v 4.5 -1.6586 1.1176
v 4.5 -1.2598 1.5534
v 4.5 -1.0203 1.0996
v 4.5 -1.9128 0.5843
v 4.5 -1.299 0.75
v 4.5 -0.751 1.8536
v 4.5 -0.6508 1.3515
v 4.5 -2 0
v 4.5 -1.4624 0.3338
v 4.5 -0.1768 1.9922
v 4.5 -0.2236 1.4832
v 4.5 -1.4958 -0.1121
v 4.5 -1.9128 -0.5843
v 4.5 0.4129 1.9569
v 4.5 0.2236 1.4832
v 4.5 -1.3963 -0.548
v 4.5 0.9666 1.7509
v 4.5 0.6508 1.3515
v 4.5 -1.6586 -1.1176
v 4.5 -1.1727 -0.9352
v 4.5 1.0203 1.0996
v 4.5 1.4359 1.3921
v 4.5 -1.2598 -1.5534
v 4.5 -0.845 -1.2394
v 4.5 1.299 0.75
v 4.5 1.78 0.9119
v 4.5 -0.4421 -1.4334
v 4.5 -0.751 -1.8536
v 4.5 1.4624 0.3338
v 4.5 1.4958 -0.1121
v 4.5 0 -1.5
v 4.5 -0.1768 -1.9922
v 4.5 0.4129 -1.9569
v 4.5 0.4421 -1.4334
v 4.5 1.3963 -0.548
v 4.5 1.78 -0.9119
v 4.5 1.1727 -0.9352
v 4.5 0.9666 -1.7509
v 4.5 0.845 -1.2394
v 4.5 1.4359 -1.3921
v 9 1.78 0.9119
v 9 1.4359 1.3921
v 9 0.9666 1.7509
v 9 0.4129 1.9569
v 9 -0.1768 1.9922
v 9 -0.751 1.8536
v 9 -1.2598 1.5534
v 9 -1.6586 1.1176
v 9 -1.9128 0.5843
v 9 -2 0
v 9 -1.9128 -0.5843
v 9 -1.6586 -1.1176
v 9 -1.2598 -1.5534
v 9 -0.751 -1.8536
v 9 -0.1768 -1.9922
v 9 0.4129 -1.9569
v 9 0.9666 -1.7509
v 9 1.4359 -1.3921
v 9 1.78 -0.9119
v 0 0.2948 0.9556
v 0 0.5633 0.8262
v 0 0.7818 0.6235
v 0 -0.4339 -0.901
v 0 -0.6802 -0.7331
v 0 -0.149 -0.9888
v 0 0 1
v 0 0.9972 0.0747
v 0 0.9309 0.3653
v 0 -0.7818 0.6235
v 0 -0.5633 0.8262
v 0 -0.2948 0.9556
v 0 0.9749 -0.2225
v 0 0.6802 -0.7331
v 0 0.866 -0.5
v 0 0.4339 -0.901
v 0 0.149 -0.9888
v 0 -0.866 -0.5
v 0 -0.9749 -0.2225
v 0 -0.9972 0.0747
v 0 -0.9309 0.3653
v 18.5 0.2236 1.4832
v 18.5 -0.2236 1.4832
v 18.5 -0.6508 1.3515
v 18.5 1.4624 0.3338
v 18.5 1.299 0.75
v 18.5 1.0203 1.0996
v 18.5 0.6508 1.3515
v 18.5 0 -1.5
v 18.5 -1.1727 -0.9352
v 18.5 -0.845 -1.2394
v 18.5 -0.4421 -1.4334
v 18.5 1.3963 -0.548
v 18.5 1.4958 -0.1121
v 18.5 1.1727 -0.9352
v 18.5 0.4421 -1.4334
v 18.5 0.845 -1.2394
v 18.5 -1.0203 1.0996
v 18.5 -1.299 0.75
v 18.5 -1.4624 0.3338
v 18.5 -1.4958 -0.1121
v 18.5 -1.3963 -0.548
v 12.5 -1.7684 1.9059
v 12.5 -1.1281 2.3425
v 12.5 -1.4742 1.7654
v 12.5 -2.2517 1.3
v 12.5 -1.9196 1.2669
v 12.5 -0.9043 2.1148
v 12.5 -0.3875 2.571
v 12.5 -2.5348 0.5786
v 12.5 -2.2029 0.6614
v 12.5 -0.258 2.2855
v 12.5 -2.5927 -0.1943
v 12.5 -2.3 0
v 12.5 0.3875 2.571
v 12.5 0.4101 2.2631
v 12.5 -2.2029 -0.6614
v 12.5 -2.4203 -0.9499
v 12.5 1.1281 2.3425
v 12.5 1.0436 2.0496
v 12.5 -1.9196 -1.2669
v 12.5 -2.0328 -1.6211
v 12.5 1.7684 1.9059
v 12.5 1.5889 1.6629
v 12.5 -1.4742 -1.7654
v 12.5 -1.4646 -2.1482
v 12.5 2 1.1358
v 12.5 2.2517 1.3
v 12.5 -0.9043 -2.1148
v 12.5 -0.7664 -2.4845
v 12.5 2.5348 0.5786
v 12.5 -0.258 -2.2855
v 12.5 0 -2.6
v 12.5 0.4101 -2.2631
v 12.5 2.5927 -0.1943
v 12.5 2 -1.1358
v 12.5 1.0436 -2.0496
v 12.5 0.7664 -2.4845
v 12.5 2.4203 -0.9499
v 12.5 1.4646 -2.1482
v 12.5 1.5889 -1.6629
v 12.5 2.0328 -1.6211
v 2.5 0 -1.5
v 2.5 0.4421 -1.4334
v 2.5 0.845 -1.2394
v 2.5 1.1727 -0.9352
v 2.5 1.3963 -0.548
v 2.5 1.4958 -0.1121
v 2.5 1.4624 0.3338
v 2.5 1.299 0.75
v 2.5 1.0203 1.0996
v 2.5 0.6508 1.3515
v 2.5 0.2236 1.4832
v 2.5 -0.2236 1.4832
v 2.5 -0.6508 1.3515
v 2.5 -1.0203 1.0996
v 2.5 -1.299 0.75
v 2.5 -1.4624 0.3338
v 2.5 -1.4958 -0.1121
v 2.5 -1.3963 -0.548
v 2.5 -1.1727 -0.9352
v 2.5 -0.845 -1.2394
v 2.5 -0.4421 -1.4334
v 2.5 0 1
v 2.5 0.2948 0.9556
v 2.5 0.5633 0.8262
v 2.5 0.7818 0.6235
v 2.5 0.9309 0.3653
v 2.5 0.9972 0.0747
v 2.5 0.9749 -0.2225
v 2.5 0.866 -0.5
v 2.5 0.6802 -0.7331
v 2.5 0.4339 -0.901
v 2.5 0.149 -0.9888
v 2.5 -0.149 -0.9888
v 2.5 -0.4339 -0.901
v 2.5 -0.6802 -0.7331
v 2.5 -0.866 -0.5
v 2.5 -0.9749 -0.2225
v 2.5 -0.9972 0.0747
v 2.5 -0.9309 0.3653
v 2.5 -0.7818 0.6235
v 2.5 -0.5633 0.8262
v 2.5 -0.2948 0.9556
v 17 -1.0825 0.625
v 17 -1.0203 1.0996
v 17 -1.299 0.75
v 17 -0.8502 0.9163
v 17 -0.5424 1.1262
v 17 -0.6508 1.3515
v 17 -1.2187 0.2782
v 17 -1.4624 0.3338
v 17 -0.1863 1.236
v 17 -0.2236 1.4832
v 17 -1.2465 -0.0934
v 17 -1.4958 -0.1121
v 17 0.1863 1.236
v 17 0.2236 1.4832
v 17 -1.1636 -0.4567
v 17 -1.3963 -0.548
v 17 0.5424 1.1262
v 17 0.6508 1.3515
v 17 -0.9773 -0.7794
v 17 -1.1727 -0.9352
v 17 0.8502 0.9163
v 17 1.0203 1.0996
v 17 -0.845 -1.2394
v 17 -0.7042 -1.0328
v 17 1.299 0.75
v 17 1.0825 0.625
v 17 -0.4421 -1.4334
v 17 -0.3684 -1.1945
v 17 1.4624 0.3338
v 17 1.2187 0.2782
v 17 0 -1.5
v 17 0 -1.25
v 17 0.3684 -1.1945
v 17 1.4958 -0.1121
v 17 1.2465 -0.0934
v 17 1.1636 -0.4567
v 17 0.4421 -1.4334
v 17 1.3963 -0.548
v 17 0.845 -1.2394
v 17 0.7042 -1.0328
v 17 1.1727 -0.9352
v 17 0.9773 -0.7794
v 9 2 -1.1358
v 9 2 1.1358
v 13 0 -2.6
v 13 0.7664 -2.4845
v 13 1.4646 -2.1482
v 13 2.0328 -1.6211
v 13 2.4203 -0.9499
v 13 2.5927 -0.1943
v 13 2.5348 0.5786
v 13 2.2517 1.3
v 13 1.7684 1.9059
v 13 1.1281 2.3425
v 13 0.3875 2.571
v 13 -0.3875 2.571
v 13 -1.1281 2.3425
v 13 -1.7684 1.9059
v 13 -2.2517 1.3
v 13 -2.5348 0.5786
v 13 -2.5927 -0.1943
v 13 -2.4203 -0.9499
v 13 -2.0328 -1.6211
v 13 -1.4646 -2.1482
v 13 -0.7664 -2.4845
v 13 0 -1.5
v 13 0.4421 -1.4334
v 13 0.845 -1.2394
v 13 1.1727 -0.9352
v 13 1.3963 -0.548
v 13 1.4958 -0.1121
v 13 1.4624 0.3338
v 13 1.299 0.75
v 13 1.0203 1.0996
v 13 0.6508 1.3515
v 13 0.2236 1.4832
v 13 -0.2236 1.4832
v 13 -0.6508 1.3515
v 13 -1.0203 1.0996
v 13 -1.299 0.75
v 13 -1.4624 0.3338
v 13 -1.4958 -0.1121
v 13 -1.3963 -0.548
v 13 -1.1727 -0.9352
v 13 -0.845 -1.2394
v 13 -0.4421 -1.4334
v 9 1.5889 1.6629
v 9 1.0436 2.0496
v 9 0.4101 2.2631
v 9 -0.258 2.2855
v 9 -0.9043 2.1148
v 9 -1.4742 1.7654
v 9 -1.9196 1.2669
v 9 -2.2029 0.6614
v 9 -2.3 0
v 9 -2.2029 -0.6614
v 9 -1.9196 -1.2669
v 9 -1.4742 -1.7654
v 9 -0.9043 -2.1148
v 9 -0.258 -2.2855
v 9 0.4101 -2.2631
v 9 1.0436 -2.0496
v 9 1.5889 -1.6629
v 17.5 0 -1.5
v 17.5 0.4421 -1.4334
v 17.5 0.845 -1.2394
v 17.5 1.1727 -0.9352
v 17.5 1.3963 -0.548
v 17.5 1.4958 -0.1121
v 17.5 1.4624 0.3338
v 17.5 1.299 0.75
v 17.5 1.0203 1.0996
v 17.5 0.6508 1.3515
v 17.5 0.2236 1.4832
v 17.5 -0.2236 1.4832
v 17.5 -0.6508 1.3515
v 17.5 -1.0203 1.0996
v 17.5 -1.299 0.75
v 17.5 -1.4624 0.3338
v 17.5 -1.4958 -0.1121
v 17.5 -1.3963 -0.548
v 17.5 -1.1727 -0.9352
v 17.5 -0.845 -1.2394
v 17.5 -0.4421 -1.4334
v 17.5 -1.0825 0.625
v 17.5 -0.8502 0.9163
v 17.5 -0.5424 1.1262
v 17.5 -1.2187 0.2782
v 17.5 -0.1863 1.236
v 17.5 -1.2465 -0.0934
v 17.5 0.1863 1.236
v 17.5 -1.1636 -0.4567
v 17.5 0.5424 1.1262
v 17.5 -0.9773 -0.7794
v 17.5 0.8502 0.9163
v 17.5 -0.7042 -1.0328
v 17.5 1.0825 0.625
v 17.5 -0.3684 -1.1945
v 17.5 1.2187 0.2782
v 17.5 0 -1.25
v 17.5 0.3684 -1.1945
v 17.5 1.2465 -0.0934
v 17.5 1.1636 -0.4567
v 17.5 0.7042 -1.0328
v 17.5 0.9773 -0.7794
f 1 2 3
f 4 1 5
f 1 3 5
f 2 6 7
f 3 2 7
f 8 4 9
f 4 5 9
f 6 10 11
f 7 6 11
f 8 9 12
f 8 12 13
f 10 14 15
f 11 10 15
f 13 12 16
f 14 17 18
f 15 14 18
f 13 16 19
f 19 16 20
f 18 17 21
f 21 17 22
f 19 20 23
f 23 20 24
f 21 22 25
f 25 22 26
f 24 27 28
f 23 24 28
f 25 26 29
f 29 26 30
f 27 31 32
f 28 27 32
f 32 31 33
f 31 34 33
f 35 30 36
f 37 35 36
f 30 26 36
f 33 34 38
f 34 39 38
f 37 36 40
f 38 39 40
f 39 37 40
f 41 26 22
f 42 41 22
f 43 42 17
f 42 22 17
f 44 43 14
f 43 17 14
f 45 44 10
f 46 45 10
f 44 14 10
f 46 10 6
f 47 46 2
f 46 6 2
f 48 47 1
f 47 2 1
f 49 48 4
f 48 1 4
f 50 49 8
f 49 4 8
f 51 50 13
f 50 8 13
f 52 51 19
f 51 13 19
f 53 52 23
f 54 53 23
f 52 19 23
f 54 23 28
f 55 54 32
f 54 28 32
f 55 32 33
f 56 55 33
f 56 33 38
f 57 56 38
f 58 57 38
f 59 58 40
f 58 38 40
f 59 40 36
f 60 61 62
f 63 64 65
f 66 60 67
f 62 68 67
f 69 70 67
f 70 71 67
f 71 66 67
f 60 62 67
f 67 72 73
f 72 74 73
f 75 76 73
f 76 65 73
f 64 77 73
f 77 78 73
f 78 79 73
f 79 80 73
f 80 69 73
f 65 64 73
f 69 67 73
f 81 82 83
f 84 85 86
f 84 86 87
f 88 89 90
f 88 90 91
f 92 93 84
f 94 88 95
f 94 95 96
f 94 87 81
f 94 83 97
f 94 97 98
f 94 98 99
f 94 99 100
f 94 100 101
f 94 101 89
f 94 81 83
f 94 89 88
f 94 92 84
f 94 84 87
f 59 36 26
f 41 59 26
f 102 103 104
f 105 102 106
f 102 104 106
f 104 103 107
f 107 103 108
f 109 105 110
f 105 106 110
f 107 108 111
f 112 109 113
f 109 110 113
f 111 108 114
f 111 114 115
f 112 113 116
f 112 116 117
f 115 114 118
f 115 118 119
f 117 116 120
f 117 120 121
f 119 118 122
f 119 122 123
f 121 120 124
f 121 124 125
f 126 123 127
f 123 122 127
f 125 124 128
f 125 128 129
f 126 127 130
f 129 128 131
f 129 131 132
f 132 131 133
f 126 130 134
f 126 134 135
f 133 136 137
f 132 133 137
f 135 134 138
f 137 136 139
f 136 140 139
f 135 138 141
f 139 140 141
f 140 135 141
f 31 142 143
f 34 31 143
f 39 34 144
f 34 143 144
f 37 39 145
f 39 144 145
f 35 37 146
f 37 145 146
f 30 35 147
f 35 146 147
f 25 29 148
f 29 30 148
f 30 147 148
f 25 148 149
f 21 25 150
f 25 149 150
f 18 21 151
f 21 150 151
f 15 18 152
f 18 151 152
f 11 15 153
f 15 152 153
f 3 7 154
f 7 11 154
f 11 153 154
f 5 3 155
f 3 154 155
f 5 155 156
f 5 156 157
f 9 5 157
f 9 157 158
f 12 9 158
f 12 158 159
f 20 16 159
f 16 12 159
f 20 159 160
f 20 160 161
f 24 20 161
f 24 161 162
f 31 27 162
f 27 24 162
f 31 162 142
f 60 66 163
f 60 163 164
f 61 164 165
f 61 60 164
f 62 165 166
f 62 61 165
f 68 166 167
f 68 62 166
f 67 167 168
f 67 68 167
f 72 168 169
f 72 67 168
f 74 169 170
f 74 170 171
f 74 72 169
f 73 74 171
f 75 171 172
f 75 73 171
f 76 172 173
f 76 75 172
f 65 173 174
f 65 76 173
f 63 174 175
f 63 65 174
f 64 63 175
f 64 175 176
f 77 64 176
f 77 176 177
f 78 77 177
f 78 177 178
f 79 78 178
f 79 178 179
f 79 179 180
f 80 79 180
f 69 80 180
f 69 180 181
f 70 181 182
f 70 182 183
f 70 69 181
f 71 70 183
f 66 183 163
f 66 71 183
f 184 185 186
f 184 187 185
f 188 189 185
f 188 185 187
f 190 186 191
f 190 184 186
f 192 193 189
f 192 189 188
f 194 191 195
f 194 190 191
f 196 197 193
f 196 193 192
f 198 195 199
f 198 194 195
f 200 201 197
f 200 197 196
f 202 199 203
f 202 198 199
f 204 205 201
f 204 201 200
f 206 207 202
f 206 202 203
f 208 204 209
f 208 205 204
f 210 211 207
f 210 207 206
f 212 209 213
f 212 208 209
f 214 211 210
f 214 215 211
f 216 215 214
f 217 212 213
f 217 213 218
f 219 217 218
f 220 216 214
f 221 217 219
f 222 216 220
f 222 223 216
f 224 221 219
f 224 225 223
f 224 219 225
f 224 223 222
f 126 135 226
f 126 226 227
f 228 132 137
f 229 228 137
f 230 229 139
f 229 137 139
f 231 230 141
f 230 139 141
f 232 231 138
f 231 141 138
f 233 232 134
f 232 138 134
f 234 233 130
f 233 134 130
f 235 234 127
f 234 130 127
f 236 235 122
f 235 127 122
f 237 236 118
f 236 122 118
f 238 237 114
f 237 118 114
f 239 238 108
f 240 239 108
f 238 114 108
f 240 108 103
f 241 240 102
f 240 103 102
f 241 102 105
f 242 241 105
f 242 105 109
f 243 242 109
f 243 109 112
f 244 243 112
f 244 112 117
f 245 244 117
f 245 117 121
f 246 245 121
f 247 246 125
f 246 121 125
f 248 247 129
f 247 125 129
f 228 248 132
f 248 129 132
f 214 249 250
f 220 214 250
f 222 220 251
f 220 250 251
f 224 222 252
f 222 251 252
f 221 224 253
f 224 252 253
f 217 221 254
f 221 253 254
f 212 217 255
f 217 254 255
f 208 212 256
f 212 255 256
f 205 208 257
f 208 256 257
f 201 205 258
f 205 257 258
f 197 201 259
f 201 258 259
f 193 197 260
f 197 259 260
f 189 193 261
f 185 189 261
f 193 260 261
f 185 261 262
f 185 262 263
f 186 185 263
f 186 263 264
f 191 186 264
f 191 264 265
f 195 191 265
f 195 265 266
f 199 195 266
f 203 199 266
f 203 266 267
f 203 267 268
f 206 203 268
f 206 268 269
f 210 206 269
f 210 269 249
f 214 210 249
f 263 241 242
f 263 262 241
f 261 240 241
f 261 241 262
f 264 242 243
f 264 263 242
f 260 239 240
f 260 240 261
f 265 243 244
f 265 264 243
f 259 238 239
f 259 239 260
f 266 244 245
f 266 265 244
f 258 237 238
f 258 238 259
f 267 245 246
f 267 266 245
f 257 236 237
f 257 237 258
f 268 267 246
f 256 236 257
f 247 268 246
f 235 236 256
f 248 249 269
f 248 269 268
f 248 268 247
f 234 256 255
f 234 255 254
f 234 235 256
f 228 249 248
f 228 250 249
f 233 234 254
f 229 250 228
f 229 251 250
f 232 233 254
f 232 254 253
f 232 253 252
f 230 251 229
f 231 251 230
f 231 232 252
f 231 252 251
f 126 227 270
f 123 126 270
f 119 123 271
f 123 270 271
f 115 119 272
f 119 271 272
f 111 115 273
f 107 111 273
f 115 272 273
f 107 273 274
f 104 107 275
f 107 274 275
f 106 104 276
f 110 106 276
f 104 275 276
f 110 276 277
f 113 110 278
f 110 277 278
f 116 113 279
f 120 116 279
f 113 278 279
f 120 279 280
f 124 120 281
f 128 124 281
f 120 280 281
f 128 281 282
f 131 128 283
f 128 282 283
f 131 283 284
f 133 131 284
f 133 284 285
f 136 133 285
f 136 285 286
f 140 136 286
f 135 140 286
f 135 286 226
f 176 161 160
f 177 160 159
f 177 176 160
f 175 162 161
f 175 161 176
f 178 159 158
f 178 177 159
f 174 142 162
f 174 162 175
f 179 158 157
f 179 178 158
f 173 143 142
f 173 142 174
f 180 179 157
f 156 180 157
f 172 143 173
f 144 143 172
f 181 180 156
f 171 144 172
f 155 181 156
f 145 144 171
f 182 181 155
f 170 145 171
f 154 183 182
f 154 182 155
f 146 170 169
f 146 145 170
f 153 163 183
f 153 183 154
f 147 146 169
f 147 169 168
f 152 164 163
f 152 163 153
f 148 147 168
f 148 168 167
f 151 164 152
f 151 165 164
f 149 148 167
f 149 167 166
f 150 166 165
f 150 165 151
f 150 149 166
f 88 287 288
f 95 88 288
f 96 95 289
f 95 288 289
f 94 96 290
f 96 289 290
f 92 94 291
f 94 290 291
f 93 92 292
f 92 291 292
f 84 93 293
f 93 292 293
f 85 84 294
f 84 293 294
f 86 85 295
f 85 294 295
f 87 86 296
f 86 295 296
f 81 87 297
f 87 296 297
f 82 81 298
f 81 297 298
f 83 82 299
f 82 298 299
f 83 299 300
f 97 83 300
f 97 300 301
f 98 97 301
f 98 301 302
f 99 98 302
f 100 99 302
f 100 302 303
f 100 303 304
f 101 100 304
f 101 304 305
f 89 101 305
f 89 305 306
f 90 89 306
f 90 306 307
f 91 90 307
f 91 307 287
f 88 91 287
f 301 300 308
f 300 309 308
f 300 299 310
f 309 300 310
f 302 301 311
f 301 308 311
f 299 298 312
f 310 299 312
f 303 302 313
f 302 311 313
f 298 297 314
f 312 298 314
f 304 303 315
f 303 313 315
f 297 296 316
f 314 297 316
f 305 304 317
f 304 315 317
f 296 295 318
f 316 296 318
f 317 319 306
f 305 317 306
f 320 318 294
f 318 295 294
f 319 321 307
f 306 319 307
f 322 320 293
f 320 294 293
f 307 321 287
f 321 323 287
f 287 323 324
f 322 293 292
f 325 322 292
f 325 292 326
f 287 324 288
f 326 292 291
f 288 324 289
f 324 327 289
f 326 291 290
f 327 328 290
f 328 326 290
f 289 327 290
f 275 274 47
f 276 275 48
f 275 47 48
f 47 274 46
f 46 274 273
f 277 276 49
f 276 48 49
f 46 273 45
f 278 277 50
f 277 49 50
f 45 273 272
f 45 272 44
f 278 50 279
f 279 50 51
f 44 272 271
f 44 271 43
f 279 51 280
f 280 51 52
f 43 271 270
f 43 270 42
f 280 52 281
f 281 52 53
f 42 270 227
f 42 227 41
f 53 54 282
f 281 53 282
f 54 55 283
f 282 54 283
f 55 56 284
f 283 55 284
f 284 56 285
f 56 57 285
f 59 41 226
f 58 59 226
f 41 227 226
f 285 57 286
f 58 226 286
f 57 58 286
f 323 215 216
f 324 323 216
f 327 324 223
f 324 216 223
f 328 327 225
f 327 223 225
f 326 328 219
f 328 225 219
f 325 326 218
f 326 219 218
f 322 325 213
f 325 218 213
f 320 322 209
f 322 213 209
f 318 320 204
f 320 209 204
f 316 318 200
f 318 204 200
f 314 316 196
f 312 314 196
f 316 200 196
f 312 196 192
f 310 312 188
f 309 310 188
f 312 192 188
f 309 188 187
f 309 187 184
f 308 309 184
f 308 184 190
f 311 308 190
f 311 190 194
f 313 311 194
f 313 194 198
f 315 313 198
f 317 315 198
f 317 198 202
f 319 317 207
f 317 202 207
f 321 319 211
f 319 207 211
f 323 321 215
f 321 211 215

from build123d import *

# Parameters (mm, degrees)
SKETCH_1_R          = 1.5
EXTRUDE_1_DEPTH     = 18.5
SKETCH_2_R          = 1.5
EXTRUDE_2_DEPTH     = 3.5
SKETCH_3_R          = 2.6
SKETCH_3_R_2        = 1.5
EXTRUDE_3_DEPTH     = 0.5
EXTRUDE_START       = 4.5
SKETCH_7_R          = 1.5
EXTRUDE_4_DEPTH     = 4.5
CUT_EXTRUDE_START   = -1.5
SKETCH_4_R          = 1.5
SKETCH_4_R_2        = 1.25
CUT_EXTRUDE_1_DEPTH = 0.5
SKETCH_5_R          = 2
SKETCH_5_R_2        = 1
CUT_EXTRUDE_2_DEPTH = 2.5


with BuildPart() as part:
    # 草图1 → 凸台-拉伸1 (new body)
    with BuildSketch(Plane(origin=(0, 0, 0), x_dir=(0, 0, -1), z_dir=(1, 0, 0))):
        Circle(SKETCH_1_R)
    extrude(amount=EXTRUDE_1_DEPTH)

    # 草图2 → 凸台-拉伸2 (add)
    with BuildSketch(Plane.ZY.offset(-9)):
        with BuildLine():
            Line((-1.135781669, 2), (1.135781669, 2))
            ThreePointArc((1.135781669, 2), (0, -2.3), (-1.135781669, 2))
        make_face()
        Circle(SKETCH_2_R, mode=Mode.SUBTRACT)
    extrude(amount=-EXTRUDE_2_DEPTH)

    # 草图3 → 凸台-拉伸3 (add)
    with BuildSketch(Plane(origin=(12.5, 0, 0), x_dir=(0, 0, -1), z_dir=(1, 0, 0))):
        Circle(SKETCH_3_R)
        with Locations(Location((0, 0, 0), (0, 0, 180))):
            Circle(SKETCH_3_R_2, mode=Mode.SUBTRACT)
    extrude(amount=EXTRUDE_3_DEPTH)

    # 草图7 → 凸台-拉伸4 (add)
    with BuildSketch(Plane.ZY.offset(-9).offset(EXTRUDE_START)):
        with BuildLine():
            Line((-0.911921049, 1.78), (0.911921049, 1.78))
            ThreePointArc((0.911921049, 1.78), (0, -2), (-0.911921049, 1.78))
        make_face()
        with Locations(Location((0, 0, 0), (0, 0, 180))):
            Circle(SKETCH_7_R, mode=Mode.SUBTRACT)
    extrude(amount=-EXTRUDE_4_DEPTH)

    # 草图4 → 切除-拉伸1 (cut)
    with BuildSketch(Plane(origin=(18.5, 0, 0), x_dir=(0, 0, -1), z_dir=(1, 0, 0)).offset(CUT_EXTRUDE_START)):
        Circle(SKETCH_4_R)
        Circle(SKETCH_4_R_2, mode=Mode.SUBTRACT)
    extrude(amount=CUT_EXTRUDE_1_DEPTH, mode=Mode.SUBTRACT)

    # 草图5 → 切除-拉伸2 (cut)
    with BuildSketch(Plane.ZY):
        Circle(SKETCH_5_R)
        Circle(SKETCH_5_R_2, mode=Mode.SUBTRACT)
    extrude(amount=-CUT_EXTRUDE_2_DEPTH, mode=Mode.SUBTRACT)


solid = part.part
